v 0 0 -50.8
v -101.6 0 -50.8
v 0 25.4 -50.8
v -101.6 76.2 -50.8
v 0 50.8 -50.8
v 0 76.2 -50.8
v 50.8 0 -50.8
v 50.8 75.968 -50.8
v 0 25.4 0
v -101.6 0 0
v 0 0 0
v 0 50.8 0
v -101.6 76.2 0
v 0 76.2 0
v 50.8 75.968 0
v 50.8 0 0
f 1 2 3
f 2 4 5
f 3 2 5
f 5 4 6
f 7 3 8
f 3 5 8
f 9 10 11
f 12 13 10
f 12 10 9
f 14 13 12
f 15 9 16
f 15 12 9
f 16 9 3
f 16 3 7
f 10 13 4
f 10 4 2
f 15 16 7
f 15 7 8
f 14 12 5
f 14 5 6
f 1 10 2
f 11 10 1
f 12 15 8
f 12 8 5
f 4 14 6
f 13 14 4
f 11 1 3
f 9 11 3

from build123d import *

# Parameters (mm, degrees)
F1_DEPTH = 50.8


with BuildPart() as f1:
    # F0 (on Top) → F1 (new body)
    with BuildSketch(Plane.XY):
        Polygon((-101.6, 0), (0, 0), (0, 25.4), (0, 50.8), (0, 76.2), (-101.6, 76.2), align=None)
        Polygon((0, 50.8), (0, 25.4), (50.8, 0), (50.8, 75.968106), align=None)
    extrude(amount=-F1_DEPTH)


solid = f1.part
